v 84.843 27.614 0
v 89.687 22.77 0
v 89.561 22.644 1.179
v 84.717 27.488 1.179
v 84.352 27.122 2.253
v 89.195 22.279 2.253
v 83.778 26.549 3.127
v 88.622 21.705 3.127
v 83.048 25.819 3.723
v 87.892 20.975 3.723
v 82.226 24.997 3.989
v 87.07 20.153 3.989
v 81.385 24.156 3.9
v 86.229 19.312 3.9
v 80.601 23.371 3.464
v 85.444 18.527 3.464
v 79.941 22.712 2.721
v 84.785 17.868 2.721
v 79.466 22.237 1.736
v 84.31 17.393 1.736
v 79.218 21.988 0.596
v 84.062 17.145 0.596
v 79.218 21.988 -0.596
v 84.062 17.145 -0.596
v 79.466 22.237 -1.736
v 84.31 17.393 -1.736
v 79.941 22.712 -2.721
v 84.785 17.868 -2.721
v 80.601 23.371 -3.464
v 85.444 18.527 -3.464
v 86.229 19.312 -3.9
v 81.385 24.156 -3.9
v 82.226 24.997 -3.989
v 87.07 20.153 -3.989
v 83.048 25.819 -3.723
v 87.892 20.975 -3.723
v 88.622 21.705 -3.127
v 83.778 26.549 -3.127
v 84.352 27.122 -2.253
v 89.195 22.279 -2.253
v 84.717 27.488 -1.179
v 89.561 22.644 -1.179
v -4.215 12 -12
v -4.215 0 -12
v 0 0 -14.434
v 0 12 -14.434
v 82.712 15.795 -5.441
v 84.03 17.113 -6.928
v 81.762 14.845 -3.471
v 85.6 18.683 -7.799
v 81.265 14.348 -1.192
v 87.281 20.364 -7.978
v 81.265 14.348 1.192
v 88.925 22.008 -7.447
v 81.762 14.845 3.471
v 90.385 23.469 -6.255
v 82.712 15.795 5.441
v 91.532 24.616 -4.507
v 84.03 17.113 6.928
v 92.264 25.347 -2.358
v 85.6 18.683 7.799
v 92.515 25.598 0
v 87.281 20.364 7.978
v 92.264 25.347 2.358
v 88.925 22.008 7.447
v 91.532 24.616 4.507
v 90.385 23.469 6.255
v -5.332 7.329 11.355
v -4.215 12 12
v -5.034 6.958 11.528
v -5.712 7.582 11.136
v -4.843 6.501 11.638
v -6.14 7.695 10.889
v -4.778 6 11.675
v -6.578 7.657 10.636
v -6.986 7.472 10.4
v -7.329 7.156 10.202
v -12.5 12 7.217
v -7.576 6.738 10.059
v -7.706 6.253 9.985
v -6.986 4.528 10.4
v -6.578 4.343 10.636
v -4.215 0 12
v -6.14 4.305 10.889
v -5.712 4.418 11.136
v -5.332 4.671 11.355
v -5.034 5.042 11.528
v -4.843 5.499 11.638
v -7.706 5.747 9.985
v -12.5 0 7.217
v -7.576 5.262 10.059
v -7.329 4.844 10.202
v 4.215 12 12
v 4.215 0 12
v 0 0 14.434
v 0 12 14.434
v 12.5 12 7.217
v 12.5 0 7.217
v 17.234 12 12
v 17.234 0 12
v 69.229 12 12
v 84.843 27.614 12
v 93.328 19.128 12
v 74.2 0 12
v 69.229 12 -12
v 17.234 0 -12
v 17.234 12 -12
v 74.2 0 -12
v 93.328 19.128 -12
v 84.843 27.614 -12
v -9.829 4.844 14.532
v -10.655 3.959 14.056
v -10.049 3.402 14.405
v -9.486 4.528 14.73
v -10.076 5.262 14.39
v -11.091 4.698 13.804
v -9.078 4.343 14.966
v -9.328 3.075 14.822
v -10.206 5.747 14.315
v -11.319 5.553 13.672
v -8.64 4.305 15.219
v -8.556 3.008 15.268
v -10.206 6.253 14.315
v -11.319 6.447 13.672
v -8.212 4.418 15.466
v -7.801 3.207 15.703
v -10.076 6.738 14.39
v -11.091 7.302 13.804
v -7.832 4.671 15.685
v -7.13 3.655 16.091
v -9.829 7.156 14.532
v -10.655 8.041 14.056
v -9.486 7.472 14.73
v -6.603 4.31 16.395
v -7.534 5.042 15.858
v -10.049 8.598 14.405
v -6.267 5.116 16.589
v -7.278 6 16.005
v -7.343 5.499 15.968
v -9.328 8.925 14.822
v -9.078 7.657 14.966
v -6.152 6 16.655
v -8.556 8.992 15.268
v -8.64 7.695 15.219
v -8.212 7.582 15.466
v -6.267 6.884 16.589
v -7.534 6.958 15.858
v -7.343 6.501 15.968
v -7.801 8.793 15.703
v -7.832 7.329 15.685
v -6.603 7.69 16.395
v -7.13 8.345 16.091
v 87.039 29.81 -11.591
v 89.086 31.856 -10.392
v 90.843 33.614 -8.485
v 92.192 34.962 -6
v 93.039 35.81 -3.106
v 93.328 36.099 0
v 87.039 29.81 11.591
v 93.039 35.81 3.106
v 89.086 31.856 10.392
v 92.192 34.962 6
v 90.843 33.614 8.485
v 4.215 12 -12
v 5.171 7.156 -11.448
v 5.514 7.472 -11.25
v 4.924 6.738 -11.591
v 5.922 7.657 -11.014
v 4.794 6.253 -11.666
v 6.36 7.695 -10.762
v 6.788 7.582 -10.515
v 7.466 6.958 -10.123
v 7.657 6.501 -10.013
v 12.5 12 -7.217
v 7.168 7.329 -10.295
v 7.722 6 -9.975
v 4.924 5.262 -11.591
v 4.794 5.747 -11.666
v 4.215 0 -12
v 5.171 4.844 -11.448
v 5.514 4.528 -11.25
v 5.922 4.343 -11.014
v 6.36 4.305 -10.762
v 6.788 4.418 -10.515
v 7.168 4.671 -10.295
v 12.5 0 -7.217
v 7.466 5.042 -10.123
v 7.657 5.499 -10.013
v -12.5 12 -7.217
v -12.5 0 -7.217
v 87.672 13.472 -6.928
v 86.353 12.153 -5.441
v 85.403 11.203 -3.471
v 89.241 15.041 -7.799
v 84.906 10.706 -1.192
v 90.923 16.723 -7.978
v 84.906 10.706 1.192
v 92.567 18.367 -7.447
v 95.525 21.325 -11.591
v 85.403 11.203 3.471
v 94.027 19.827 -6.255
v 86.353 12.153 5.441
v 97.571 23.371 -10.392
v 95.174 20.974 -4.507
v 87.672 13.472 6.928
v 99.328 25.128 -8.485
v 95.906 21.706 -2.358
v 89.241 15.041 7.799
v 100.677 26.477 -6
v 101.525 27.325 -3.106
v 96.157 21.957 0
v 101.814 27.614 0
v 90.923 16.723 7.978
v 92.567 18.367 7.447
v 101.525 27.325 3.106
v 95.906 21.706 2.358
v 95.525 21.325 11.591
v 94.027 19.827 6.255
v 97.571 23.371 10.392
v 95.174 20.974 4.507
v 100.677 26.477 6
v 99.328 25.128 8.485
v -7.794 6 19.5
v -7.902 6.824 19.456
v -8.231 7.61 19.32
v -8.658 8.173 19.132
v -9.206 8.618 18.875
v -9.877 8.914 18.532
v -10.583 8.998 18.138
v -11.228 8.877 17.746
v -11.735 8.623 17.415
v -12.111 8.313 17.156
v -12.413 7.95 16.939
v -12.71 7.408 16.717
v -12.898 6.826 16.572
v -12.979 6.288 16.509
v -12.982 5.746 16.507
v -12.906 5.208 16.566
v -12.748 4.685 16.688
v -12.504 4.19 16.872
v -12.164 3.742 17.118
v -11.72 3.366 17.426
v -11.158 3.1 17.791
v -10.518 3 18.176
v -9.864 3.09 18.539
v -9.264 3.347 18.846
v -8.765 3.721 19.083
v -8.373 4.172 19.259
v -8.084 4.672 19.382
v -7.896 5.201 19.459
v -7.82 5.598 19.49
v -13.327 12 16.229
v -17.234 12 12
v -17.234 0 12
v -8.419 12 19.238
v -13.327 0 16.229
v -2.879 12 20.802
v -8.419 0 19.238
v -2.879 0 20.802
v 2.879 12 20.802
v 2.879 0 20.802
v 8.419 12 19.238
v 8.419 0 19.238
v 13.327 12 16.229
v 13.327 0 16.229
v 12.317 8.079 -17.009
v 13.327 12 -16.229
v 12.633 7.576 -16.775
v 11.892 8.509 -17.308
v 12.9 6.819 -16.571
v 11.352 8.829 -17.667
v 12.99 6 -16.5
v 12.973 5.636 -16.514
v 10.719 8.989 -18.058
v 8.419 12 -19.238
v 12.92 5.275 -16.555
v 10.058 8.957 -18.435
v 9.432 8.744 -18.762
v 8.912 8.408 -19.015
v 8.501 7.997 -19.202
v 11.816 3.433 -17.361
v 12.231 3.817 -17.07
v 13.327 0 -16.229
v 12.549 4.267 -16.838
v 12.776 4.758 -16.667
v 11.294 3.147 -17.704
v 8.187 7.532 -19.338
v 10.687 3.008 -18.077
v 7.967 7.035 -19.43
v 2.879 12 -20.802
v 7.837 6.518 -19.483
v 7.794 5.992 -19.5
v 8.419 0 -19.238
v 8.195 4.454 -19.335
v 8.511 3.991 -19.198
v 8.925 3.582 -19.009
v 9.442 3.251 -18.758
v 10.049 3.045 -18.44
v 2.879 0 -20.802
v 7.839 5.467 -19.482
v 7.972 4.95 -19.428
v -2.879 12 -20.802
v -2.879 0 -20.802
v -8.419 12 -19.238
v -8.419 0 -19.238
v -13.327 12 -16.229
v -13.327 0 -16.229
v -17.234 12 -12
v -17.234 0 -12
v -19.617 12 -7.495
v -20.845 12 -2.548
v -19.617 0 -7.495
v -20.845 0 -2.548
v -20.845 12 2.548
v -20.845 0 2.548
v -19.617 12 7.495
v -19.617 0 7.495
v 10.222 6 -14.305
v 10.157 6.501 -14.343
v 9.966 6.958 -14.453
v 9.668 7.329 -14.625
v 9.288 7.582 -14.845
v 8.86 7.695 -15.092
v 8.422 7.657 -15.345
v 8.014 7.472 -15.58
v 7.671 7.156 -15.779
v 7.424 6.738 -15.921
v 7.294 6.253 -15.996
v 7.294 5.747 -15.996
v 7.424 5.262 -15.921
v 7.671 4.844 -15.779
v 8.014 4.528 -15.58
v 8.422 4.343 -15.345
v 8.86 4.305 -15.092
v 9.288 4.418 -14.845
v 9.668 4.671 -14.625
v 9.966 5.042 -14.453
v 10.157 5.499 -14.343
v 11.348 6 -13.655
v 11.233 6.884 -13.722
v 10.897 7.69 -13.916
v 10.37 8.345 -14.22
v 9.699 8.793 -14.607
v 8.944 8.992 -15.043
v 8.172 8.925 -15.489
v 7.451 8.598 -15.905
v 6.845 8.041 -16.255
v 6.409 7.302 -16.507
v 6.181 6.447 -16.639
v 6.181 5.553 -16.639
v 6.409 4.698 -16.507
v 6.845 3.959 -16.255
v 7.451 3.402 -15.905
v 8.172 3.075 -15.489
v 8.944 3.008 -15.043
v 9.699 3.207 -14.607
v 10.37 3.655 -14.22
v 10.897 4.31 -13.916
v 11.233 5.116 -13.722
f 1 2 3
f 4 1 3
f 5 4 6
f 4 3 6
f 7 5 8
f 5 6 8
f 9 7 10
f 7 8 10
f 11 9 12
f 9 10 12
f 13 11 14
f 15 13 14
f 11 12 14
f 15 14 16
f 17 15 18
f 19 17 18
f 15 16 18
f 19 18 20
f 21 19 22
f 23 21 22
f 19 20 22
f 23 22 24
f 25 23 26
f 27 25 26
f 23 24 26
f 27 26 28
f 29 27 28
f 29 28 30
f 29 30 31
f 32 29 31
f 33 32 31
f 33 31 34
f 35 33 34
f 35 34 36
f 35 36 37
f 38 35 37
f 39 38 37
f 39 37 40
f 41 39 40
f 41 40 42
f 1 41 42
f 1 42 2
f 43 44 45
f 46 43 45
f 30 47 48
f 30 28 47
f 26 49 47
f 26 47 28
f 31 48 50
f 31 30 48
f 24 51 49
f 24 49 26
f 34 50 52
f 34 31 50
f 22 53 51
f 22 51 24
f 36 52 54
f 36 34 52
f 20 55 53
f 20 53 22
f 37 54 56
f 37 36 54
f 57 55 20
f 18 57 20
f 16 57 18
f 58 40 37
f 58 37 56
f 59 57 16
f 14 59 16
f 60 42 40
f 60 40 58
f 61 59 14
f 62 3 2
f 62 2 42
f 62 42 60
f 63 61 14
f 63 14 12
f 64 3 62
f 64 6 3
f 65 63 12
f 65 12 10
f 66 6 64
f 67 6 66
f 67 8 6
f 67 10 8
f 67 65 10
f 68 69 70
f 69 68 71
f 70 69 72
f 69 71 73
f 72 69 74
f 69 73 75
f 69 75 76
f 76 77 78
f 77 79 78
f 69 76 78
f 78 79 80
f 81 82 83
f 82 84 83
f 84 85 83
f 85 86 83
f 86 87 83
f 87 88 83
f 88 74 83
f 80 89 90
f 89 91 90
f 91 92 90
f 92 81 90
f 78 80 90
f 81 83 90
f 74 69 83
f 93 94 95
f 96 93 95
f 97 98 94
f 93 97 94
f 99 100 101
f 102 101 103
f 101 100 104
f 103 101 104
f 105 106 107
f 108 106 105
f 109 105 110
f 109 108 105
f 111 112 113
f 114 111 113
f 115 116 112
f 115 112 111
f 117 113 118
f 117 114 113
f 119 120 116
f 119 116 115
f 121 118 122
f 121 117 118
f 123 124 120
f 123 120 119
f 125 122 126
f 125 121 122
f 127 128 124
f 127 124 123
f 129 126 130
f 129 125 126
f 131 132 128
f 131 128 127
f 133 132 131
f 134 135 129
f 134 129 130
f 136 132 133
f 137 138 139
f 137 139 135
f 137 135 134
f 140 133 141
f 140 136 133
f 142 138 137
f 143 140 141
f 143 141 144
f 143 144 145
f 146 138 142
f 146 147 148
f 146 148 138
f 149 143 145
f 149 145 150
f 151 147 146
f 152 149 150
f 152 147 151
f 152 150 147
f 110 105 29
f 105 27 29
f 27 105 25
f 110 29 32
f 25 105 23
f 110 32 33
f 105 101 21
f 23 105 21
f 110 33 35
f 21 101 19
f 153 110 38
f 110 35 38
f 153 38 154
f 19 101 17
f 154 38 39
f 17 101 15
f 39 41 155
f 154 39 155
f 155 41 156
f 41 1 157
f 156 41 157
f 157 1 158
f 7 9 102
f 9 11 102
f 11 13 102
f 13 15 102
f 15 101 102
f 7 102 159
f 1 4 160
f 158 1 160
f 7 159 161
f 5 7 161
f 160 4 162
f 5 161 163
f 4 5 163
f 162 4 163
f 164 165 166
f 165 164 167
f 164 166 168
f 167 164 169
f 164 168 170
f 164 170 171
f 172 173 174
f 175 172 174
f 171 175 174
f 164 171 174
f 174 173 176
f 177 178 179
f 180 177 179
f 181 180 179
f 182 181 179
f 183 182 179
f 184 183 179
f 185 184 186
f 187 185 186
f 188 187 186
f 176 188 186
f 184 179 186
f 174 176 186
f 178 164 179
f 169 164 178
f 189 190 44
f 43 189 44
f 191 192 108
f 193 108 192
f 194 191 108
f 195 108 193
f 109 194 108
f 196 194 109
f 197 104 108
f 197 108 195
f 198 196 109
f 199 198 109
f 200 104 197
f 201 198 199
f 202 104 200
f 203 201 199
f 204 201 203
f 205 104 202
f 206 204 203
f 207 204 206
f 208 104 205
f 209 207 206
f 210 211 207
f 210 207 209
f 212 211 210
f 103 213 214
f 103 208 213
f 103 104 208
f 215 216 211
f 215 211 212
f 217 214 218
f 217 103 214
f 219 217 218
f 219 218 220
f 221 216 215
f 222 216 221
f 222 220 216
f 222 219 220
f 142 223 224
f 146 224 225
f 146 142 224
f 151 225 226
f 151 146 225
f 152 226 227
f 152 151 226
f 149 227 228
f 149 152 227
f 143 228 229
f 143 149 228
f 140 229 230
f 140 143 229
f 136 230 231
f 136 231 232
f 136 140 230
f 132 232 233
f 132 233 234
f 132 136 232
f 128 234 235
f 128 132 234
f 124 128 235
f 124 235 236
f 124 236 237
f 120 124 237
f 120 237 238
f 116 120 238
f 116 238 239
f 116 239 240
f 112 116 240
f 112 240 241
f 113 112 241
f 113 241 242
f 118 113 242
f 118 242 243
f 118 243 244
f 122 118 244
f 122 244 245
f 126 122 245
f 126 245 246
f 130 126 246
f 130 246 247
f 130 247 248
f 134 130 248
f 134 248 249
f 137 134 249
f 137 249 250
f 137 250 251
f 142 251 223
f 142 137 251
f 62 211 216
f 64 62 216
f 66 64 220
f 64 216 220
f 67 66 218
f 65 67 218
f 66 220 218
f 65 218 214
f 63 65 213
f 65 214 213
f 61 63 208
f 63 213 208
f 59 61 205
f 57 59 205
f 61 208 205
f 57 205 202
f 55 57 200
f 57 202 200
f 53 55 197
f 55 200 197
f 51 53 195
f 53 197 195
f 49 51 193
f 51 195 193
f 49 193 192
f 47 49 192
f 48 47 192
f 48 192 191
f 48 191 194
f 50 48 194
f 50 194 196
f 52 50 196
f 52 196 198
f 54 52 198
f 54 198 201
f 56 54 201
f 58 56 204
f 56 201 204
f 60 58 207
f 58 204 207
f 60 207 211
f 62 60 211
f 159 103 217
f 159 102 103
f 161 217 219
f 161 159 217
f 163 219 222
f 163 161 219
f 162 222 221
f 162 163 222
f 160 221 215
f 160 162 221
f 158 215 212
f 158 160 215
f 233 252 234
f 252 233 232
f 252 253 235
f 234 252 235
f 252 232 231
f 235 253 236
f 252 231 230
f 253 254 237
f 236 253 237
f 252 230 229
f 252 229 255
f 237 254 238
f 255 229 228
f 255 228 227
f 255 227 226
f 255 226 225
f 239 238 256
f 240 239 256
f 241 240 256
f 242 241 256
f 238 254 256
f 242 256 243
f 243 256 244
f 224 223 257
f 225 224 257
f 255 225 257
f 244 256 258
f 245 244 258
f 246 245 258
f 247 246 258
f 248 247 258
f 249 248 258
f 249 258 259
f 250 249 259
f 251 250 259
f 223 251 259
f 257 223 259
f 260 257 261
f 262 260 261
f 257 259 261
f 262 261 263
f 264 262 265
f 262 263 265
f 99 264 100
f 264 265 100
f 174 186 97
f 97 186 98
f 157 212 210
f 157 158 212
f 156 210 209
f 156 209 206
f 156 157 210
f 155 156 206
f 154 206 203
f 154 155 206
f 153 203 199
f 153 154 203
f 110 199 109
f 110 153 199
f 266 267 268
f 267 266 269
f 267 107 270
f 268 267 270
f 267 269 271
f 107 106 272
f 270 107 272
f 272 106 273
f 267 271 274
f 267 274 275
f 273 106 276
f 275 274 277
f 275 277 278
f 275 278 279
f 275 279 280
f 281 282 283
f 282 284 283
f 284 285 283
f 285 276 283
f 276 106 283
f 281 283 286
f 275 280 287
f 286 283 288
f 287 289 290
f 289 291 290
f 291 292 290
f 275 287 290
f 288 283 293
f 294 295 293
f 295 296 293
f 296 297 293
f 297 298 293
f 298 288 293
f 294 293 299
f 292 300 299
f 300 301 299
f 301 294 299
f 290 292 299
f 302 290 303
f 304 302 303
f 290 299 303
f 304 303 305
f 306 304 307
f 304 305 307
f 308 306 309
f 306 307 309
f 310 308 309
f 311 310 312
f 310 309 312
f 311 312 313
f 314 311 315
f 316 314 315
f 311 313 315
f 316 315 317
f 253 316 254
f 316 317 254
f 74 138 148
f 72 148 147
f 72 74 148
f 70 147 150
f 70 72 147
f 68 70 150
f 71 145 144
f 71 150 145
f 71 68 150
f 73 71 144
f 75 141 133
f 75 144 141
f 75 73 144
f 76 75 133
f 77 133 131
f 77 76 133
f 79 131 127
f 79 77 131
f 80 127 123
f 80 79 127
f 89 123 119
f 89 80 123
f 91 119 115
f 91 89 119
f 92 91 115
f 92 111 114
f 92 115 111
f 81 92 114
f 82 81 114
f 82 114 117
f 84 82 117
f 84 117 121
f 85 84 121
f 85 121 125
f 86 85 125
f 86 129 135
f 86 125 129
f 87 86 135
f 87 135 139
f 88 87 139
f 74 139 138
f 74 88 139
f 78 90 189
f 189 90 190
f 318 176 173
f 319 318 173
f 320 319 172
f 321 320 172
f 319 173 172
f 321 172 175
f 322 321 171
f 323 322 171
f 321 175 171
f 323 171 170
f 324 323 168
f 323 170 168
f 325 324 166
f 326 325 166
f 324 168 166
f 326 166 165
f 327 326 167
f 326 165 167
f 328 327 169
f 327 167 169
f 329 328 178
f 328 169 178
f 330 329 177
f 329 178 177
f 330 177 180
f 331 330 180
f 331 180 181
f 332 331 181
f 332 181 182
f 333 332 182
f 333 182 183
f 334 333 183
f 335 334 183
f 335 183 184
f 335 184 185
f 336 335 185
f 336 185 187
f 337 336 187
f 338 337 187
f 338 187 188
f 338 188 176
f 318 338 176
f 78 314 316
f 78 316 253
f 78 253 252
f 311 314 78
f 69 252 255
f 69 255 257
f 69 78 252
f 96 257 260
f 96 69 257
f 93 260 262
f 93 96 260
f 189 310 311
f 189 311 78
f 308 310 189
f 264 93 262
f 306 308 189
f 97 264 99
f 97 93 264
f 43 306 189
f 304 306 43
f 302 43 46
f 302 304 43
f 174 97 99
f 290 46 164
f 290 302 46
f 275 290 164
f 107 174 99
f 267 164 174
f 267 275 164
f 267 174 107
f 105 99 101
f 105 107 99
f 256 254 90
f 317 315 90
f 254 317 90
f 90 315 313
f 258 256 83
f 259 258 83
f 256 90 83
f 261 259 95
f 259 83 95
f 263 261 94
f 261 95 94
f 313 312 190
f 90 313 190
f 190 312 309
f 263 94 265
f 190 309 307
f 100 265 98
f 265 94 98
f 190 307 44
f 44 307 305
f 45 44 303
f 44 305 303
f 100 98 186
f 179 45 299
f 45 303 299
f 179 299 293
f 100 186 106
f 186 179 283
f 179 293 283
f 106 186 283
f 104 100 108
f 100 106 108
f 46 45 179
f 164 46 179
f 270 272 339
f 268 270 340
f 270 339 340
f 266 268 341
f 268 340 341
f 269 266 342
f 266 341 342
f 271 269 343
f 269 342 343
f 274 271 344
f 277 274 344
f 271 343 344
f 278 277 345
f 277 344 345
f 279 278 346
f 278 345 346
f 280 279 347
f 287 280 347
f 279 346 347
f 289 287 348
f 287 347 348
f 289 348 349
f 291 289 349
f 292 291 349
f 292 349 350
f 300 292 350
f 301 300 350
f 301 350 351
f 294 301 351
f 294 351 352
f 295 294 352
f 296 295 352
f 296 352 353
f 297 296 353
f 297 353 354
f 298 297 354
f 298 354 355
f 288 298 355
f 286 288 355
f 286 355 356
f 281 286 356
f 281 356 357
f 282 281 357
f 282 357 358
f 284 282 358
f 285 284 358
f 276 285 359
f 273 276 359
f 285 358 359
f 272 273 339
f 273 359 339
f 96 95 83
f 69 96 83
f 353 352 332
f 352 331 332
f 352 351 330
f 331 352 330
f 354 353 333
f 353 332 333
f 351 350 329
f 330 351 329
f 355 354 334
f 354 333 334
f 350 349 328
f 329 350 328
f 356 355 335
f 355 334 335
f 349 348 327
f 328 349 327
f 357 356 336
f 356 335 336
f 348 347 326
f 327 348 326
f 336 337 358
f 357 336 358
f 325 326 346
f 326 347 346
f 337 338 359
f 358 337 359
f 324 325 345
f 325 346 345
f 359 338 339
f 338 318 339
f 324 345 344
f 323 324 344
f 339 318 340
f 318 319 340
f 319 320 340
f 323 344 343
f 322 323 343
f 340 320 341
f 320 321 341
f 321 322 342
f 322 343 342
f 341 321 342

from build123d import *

# Parameters (mm, degrees)
BOSS_EXTRUDE1_DEPTH = 12
SKETCH4_W           = 39.051681067
SKETCH4_H           = 24
SKETCH4_R           = 4
BOSS_EXTRUDE2_DEPTH = 12
SKETCH4_3_R         = 8
SKETCH4_3_R_2       = 4
CUT_EXTRUDE1_DEPTH  = 5.15
FILLET1_R           = 12
SKETCH5_R           = 1.7
CUT_EXTRUDE2_DEPTH  = 107.997244305
CUT_EXTRUDE3_START  = -5
SKETCH5_3_R         = 3
CUT_EXTRUDE3_DEPTH  = 102.997244335


with BuildPart() as part:
    # Sketch3 → Boss-Extrude1 (new body)
    with BuildSketch(Plane(origin=(0, 0, 0), x_dir=(1, 0, 0), z_dir=(0, 1, 0))):
        with BuildLine():
            Line((-4.215390309, -12), (-17.23368794, -12))
            ThreePointArc((-17.23368794, -12), (0, -21), (17.23368794, -12))
            Line((17.23368794, -12), (4.215390309, -12))
            Line((4.215390309, -12), (0, -14.43375673))
            Line((0, -14.43375673), (-4.215390309, -12))
        make_face()
        with BuildLine():
            Line((17.23368794, 12), (4.215390309, 12))
            Line((4.215390309, 12), (12.5, 7.216878365))
            Line((12.5, 7.216878365), (12.5, -7.216878365))
            Line((12.5, -7.216878365), (4.215390309, -12))
            Line((4.215390309, -12), (17.23368794, -12))
            ThreePointArc((17.23368794, -12), (20.036310124, -6.288583039), (21, 0))
            ThreePointArc((21, 0), (20.036310124, 6.288583039), (17.23368794, 12))
        make_face()
        with BuildLine():
            Line((-12.5, 7.216878365), (-4.215390309, 12))
            Line((-4.215390309, 12), (-17.23368794, 12))
            ThreePointArc((-17.23368794, 12), (-21, 0), (-17.23368794, -12))
            Line((-17.23368794, -12), (-4.215390309, -12))
            Line((-4.215390309, -12), (-12.5, -7.216878365))
            Line((-12.5, -7.216878365), (-12.5, 7.216878365))
        make_face()
        with BuildLine():
            Line((-4.215390309, 12), (0, 14.43375673))
            Line((0, 14.43375673), (4.215390309, 12))
            Line((4.215390309, 12), (17.23368794, 12))
            ThreePointArc((17.23368794, 12), (0, 21), (-17.23368794, 12))
            Line((-17.23368794, 12), (-4.215390309, 12))
        make_face()
        with BuildLine():
            Line((74.2, 12), (17.23368794, 12))
            ThreePointArc((17.23368794, 12), (20.036310124, 6.288583039), (21, 0))
            ThreePointArc((21, 0), (20.036310124, -6.288583039), (17.23368794, -12))
            Line((17.23368794, -12), (74.2, -12))
            Line((74.2, -12), (74.2, 12))
        make_face()
    extrude(amount=BOSS_EXTRUDE1_DEPTH)

    # Sketch4 → Boss-Extrude2 (add)
    with BuildSketch(Plane(origin=(37.1, -37.1, 0), x_dir=(0.7071067811865462, 0.7071067811865489, 0), z_dir=(0.7071067811865489, -0.7071067811865462, 0))):
        with Locations((71.993163698, 0)):
            Rectangle(SKETCH4_W, SKETCH4_H)
        with Locations((75.519004231, 0)):
            Circle(SKETCH4_R, mode=Mode.SUBTRACT)
    extrude(amount=-BOSS_EXTRUDE2_DEPTH)

    # Sketch4<3> → Cut-Extrude1 (cut)
    with BuildSketch(Plane(origin=(37.1, -37.1, 0), x_dir=(0.7071067811865462, 0.7071067811865489, 0), z_dir=(0.7071067811865489, -0.7071067811865462, 0))):
        with Locations((75.519004231, 0)):
            Circle(SKETCH4_3_R)
        with Locations((75.519004231, 0)):
            Circle(SKETCH4_3_R_2, mode=Mode.SUBTRACT)
    extrude(amount=-CUT_EXTRUDE1_DEPTH, mode=Mode.SUBTRACT)

    # Fillet1
    fillet1_edges = [part.edges().sort_by_distance(p)[0] for p in [
        (97.571067812, 31.856349186, -12),
        (97.571067812, 31.856349186, 12),
    ]]
    fillet(fillet1_edges, radius=FILLET1_R - 0.0001)  # a hair under: the kernel refuses the full size

    # Sketch5 → Cut-Extrude2 (cut, through all)
    with BuildSketch(Plane(origin=(6.25, 0, -10.825317547), x_dir=(0.8660254037844386, 0, 0.5), z_dir=(-0.5000000000000001, 0, 0.8660254037844387))):
        with Locations((0, 6)):
            Circle(SKETCH5_R)
    cut_extrude2 = extrude(amount=-CUT_EXTRUDE2_DEPTH, mode=Mode.SUBTRACT)

    # Sketch5<3> → Cut-Extrude3 (cut, through all)
    with BuildSketch(Plane(origin=(6.25, 0, -10.825317547), x_dir=(0.8660254037844386, 0, 0.5), z_dir=(-0.5000000000000001, 0, 0.8660254037844387)).offset(CUT_EXTRUDE3_START)):
        with Locations((0, 6)):
            Circle(SKETCH5_3_R)
    cut_extrude3 = extrude(amount=-CUT_EXTRUDE3_DEPTH, mode=Mode.SUBTRACT)

    # Mirror1: Cut-Extrude2, Cut-Extrude3 across plane
    add(cut_extrude2.mirror(Plane(origin=(0, 0, 0), x_dir=(0.8660254037844386, 0, 0.5000000000000002), z_dir=(-0.5, 0, 0.8660254037844386))), mode=Mode.SUBTRACT)
    add(cut_extrude3.mirror(Plane(origin=(0, 0, 0), x_dir=(0.8660254037844386, 0, 0.5000000000000002), z_dir=(-0.5, 0, 0.8660254037844386))), mode=Mode.SUBTRACT)


solid = part.part
